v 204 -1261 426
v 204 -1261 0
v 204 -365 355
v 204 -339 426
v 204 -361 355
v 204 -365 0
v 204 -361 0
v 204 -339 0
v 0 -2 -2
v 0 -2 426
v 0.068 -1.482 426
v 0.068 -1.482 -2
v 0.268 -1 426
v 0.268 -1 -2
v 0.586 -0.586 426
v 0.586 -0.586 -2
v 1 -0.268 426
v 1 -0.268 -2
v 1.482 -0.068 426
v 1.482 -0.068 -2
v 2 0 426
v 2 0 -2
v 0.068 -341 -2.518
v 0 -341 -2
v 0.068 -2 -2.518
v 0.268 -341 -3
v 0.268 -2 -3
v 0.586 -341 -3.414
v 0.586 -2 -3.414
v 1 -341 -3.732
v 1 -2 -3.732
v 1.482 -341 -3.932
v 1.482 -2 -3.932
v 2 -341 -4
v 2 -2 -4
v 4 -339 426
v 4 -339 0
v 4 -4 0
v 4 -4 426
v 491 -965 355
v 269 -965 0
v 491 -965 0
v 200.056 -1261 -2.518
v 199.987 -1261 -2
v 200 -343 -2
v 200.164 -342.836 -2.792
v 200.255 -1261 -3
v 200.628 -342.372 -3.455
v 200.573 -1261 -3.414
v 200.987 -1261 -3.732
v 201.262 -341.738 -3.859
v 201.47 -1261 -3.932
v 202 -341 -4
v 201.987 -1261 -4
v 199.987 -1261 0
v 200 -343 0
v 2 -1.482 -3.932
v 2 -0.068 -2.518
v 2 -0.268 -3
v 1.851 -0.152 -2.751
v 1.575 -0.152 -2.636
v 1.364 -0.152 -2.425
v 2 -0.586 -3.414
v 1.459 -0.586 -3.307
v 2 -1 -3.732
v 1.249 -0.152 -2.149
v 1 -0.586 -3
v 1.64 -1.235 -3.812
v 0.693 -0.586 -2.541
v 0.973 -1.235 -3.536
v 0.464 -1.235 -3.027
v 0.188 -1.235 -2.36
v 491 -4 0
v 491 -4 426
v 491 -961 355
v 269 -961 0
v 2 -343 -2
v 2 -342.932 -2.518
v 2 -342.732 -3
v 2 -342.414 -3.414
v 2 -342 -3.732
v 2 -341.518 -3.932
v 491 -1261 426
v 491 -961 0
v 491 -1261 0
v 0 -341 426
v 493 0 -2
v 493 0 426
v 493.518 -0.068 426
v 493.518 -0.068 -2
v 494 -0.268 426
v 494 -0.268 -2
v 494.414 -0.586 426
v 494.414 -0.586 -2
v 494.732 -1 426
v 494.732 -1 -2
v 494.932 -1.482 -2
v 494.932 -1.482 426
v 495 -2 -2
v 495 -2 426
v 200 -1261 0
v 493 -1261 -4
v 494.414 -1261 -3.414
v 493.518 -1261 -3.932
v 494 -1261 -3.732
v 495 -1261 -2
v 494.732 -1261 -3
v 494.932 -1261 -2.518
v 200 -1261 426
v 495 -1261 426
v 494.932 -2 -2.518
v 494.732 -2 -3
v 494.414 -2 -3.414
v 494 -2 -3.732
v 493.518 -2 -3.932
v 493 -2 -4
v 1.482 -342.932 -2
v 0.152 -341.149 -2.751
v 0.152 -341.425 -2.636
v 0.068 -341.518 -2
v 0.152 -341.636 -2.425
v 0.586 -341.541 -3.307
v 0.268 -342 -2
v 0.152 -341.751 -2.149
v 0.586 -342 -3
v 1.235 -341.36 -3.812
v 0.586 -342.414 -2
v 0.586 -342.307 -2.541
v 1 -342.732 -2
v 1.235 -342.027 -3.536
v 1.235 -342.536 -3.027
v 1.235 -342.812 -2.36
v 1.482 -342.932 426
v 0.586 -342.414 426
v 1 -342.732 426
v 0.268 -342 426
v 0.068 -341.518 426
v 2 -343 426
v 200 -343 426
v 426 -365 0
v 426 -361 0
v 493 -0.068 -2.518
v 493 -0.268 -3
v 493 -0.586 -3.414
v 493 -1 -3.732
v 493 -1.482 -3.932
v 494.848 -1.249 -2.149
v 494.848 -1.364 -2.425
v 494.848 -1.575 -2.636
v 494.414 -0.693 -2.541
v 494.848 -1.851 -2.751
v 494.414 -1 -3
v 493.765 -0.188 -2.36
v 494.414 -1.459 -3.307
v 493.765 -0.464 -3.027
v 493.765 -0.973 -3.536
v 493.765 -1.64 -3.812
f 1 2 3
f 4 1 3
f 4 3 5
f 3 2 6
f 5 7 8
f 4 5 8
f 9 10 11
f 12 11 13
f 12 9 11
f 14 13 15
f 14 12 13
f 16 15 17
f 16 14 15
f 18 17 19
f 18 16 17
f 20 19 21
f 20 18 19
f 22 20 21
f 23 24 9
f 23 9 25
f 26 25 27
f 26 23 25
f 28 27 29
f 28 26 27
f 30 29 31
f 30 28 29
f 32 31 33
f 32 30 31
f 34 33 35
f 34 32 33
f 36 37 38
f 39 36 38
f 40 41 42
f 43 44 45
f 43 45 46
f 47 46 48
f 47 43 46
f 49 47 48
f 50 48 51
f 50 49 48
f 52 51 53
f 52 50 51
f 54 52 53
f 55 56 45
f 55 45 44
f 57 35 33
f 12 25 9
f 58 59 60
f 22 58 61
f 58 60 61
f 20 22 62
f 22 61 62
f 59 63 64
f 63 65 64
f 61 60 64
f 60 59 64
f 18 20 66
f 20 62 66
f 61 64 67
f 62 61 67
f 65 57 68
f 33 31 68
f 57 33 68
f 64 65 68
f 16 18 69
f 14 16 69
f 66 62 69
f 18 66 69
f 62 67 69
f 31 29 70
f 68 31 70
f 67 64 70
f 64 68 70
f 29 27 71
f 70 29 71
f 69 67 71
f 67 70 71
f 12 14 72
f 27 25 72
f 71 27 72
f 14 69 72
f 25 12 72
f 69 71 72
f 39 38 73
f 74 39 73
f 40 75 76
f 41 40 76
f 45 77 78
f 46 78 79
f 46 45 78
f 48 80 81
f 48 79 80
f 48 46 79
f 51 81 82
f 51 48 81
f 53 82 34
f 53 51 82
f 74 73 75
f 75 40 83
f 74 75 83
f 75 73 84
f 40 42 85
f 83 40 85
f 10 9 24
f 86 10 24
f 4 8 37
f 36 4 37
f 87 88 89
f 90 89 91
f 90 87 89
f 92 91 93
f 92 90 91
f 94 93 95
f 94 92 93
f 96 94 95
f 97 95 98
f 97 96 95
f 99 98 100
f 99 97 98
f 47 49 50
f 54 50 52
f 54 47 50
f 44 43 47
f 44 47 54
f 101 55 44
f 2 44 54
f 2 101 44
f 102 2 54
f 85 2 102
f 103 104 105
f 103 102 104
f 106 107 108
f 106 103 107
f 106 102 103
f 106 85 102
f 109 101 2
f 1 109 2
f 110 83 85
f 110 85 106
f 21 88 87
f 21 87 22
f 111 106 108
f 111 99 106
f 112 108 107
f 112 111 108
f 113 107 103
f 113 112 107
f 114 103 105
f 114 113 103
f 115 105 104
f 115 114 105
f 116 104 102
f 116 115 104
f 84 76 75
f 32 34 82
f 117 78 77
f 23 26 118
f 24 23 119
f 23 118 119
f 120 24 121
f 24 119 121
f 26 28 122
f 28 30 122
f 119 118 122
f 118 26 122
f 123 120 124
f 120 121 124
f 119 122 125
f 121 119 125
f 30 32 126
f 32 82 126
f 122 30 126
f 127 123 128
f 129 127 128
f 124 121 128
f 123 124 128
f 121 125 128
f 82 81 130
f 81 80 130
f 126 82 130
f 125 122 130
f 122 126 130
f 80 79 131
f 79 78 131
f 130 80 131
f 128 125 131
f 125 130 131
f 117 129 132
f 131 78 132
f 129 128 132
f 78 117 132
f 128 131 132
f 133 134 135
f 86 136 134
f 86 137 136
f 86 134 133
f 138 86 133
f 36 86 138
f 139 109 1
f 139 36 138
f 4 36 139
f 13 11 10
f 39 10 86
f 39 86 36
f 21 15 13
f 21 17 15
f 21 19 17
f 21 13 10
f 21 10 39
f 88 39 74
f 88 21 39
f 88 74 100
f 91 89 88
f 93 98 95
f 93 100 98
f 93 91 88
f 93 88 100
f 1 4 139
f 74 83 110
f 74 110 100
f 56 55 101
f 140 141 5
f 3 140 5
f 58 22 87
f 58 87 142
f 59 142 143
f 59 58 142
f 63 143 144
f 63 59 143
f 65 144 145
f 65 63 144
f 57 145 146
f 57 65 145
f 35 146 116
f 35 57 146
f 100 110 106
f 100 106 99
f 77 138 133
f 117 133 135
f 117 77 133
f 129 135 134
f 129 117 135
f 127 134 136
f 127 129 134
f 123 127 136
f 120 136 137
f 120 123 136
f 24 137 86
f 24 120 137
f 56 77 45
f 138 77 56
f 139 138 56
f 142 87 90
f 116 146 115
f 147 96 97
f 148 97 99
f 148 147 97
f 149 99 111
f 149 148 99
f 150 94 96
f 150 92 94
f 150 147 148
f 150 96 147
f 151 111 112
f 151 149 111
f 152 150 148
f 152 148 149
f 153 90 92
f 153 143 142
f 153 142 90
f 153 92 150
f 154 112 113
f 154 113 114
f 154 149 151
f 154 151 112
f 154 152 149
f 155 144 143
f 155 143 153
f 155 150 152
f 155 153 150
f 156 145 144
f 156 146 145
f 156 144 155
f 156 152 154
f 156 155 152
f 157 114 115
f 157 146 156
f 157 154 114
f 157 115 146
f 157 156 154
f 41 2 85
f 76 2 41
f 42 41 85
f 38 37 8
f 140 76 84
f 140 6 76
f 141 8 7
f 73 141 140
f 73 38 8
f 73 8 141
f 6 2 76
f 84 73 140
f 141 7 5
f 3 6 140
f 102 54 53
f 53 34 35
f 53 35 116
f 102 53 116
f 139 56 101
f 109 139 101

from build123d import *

# Parameters (mm, degrees)
F1_DEPTH  = 426
F3_DEPTH  = 4
F4_R      = 2
F7_DEPTH  = 4
F10_DEPTH = 4


# Not quite as in the source:
# - a feature names something its author has since deleted; it is built from what else it names


with BuildPart() as f1:
    # F0 (on Top) → F1 (new body)
    with BuildSketch(Plane.XY):
        Polygon((495, 0), (0, 0), (0, -343), (200, -343), (200, -1261), (204, -1261), (204, -339), (4, -339), (4, -4), (491, -4), (491, -1261), (495, -1261), align=None)
    extrude(amount=F1_DEPTH)

    # F2 (on Top) → F3 (join)
    with BuildSketch(Plane.XY):
        Polygon((0, -343), (200, -343), (199.9874711037, -1261), (495, -1261), (495, 0), (0, 0), align=None)
    extrude(amount=-F3_DEPTH)

    # F4
    f4_edges = [f1.edges().sort_by_distance(p)[0] for p in [
        (100, -343, -4),
        (0, -171.5, -4),
        (247.5, 0, -4),
        (0, -343, 211),
        (0, 0, 211),
        (495, 0, 211),
        (199.993736, -802, -4),
        (495, -630.5, -4),
    ]]
    fillet(f4_edges, radius=F4_R)

    # F6 (on offset) → F7 (join)
    with BuildSketch(Plane.XZ.offset(961)):
        Polygon((269, 0), (491, 0), (491, 355), align=None)
    extrude(amount=F7_DEPTH)

    # F9 (on offset) → F10 (join)
    with BuildSketch(Plane.XZ.offset(361)):
        Polygon((204, 355), (204, 0), (426, 0), align=None)
    extrude(amount=F10_DEPTH)


solid = f1.part
